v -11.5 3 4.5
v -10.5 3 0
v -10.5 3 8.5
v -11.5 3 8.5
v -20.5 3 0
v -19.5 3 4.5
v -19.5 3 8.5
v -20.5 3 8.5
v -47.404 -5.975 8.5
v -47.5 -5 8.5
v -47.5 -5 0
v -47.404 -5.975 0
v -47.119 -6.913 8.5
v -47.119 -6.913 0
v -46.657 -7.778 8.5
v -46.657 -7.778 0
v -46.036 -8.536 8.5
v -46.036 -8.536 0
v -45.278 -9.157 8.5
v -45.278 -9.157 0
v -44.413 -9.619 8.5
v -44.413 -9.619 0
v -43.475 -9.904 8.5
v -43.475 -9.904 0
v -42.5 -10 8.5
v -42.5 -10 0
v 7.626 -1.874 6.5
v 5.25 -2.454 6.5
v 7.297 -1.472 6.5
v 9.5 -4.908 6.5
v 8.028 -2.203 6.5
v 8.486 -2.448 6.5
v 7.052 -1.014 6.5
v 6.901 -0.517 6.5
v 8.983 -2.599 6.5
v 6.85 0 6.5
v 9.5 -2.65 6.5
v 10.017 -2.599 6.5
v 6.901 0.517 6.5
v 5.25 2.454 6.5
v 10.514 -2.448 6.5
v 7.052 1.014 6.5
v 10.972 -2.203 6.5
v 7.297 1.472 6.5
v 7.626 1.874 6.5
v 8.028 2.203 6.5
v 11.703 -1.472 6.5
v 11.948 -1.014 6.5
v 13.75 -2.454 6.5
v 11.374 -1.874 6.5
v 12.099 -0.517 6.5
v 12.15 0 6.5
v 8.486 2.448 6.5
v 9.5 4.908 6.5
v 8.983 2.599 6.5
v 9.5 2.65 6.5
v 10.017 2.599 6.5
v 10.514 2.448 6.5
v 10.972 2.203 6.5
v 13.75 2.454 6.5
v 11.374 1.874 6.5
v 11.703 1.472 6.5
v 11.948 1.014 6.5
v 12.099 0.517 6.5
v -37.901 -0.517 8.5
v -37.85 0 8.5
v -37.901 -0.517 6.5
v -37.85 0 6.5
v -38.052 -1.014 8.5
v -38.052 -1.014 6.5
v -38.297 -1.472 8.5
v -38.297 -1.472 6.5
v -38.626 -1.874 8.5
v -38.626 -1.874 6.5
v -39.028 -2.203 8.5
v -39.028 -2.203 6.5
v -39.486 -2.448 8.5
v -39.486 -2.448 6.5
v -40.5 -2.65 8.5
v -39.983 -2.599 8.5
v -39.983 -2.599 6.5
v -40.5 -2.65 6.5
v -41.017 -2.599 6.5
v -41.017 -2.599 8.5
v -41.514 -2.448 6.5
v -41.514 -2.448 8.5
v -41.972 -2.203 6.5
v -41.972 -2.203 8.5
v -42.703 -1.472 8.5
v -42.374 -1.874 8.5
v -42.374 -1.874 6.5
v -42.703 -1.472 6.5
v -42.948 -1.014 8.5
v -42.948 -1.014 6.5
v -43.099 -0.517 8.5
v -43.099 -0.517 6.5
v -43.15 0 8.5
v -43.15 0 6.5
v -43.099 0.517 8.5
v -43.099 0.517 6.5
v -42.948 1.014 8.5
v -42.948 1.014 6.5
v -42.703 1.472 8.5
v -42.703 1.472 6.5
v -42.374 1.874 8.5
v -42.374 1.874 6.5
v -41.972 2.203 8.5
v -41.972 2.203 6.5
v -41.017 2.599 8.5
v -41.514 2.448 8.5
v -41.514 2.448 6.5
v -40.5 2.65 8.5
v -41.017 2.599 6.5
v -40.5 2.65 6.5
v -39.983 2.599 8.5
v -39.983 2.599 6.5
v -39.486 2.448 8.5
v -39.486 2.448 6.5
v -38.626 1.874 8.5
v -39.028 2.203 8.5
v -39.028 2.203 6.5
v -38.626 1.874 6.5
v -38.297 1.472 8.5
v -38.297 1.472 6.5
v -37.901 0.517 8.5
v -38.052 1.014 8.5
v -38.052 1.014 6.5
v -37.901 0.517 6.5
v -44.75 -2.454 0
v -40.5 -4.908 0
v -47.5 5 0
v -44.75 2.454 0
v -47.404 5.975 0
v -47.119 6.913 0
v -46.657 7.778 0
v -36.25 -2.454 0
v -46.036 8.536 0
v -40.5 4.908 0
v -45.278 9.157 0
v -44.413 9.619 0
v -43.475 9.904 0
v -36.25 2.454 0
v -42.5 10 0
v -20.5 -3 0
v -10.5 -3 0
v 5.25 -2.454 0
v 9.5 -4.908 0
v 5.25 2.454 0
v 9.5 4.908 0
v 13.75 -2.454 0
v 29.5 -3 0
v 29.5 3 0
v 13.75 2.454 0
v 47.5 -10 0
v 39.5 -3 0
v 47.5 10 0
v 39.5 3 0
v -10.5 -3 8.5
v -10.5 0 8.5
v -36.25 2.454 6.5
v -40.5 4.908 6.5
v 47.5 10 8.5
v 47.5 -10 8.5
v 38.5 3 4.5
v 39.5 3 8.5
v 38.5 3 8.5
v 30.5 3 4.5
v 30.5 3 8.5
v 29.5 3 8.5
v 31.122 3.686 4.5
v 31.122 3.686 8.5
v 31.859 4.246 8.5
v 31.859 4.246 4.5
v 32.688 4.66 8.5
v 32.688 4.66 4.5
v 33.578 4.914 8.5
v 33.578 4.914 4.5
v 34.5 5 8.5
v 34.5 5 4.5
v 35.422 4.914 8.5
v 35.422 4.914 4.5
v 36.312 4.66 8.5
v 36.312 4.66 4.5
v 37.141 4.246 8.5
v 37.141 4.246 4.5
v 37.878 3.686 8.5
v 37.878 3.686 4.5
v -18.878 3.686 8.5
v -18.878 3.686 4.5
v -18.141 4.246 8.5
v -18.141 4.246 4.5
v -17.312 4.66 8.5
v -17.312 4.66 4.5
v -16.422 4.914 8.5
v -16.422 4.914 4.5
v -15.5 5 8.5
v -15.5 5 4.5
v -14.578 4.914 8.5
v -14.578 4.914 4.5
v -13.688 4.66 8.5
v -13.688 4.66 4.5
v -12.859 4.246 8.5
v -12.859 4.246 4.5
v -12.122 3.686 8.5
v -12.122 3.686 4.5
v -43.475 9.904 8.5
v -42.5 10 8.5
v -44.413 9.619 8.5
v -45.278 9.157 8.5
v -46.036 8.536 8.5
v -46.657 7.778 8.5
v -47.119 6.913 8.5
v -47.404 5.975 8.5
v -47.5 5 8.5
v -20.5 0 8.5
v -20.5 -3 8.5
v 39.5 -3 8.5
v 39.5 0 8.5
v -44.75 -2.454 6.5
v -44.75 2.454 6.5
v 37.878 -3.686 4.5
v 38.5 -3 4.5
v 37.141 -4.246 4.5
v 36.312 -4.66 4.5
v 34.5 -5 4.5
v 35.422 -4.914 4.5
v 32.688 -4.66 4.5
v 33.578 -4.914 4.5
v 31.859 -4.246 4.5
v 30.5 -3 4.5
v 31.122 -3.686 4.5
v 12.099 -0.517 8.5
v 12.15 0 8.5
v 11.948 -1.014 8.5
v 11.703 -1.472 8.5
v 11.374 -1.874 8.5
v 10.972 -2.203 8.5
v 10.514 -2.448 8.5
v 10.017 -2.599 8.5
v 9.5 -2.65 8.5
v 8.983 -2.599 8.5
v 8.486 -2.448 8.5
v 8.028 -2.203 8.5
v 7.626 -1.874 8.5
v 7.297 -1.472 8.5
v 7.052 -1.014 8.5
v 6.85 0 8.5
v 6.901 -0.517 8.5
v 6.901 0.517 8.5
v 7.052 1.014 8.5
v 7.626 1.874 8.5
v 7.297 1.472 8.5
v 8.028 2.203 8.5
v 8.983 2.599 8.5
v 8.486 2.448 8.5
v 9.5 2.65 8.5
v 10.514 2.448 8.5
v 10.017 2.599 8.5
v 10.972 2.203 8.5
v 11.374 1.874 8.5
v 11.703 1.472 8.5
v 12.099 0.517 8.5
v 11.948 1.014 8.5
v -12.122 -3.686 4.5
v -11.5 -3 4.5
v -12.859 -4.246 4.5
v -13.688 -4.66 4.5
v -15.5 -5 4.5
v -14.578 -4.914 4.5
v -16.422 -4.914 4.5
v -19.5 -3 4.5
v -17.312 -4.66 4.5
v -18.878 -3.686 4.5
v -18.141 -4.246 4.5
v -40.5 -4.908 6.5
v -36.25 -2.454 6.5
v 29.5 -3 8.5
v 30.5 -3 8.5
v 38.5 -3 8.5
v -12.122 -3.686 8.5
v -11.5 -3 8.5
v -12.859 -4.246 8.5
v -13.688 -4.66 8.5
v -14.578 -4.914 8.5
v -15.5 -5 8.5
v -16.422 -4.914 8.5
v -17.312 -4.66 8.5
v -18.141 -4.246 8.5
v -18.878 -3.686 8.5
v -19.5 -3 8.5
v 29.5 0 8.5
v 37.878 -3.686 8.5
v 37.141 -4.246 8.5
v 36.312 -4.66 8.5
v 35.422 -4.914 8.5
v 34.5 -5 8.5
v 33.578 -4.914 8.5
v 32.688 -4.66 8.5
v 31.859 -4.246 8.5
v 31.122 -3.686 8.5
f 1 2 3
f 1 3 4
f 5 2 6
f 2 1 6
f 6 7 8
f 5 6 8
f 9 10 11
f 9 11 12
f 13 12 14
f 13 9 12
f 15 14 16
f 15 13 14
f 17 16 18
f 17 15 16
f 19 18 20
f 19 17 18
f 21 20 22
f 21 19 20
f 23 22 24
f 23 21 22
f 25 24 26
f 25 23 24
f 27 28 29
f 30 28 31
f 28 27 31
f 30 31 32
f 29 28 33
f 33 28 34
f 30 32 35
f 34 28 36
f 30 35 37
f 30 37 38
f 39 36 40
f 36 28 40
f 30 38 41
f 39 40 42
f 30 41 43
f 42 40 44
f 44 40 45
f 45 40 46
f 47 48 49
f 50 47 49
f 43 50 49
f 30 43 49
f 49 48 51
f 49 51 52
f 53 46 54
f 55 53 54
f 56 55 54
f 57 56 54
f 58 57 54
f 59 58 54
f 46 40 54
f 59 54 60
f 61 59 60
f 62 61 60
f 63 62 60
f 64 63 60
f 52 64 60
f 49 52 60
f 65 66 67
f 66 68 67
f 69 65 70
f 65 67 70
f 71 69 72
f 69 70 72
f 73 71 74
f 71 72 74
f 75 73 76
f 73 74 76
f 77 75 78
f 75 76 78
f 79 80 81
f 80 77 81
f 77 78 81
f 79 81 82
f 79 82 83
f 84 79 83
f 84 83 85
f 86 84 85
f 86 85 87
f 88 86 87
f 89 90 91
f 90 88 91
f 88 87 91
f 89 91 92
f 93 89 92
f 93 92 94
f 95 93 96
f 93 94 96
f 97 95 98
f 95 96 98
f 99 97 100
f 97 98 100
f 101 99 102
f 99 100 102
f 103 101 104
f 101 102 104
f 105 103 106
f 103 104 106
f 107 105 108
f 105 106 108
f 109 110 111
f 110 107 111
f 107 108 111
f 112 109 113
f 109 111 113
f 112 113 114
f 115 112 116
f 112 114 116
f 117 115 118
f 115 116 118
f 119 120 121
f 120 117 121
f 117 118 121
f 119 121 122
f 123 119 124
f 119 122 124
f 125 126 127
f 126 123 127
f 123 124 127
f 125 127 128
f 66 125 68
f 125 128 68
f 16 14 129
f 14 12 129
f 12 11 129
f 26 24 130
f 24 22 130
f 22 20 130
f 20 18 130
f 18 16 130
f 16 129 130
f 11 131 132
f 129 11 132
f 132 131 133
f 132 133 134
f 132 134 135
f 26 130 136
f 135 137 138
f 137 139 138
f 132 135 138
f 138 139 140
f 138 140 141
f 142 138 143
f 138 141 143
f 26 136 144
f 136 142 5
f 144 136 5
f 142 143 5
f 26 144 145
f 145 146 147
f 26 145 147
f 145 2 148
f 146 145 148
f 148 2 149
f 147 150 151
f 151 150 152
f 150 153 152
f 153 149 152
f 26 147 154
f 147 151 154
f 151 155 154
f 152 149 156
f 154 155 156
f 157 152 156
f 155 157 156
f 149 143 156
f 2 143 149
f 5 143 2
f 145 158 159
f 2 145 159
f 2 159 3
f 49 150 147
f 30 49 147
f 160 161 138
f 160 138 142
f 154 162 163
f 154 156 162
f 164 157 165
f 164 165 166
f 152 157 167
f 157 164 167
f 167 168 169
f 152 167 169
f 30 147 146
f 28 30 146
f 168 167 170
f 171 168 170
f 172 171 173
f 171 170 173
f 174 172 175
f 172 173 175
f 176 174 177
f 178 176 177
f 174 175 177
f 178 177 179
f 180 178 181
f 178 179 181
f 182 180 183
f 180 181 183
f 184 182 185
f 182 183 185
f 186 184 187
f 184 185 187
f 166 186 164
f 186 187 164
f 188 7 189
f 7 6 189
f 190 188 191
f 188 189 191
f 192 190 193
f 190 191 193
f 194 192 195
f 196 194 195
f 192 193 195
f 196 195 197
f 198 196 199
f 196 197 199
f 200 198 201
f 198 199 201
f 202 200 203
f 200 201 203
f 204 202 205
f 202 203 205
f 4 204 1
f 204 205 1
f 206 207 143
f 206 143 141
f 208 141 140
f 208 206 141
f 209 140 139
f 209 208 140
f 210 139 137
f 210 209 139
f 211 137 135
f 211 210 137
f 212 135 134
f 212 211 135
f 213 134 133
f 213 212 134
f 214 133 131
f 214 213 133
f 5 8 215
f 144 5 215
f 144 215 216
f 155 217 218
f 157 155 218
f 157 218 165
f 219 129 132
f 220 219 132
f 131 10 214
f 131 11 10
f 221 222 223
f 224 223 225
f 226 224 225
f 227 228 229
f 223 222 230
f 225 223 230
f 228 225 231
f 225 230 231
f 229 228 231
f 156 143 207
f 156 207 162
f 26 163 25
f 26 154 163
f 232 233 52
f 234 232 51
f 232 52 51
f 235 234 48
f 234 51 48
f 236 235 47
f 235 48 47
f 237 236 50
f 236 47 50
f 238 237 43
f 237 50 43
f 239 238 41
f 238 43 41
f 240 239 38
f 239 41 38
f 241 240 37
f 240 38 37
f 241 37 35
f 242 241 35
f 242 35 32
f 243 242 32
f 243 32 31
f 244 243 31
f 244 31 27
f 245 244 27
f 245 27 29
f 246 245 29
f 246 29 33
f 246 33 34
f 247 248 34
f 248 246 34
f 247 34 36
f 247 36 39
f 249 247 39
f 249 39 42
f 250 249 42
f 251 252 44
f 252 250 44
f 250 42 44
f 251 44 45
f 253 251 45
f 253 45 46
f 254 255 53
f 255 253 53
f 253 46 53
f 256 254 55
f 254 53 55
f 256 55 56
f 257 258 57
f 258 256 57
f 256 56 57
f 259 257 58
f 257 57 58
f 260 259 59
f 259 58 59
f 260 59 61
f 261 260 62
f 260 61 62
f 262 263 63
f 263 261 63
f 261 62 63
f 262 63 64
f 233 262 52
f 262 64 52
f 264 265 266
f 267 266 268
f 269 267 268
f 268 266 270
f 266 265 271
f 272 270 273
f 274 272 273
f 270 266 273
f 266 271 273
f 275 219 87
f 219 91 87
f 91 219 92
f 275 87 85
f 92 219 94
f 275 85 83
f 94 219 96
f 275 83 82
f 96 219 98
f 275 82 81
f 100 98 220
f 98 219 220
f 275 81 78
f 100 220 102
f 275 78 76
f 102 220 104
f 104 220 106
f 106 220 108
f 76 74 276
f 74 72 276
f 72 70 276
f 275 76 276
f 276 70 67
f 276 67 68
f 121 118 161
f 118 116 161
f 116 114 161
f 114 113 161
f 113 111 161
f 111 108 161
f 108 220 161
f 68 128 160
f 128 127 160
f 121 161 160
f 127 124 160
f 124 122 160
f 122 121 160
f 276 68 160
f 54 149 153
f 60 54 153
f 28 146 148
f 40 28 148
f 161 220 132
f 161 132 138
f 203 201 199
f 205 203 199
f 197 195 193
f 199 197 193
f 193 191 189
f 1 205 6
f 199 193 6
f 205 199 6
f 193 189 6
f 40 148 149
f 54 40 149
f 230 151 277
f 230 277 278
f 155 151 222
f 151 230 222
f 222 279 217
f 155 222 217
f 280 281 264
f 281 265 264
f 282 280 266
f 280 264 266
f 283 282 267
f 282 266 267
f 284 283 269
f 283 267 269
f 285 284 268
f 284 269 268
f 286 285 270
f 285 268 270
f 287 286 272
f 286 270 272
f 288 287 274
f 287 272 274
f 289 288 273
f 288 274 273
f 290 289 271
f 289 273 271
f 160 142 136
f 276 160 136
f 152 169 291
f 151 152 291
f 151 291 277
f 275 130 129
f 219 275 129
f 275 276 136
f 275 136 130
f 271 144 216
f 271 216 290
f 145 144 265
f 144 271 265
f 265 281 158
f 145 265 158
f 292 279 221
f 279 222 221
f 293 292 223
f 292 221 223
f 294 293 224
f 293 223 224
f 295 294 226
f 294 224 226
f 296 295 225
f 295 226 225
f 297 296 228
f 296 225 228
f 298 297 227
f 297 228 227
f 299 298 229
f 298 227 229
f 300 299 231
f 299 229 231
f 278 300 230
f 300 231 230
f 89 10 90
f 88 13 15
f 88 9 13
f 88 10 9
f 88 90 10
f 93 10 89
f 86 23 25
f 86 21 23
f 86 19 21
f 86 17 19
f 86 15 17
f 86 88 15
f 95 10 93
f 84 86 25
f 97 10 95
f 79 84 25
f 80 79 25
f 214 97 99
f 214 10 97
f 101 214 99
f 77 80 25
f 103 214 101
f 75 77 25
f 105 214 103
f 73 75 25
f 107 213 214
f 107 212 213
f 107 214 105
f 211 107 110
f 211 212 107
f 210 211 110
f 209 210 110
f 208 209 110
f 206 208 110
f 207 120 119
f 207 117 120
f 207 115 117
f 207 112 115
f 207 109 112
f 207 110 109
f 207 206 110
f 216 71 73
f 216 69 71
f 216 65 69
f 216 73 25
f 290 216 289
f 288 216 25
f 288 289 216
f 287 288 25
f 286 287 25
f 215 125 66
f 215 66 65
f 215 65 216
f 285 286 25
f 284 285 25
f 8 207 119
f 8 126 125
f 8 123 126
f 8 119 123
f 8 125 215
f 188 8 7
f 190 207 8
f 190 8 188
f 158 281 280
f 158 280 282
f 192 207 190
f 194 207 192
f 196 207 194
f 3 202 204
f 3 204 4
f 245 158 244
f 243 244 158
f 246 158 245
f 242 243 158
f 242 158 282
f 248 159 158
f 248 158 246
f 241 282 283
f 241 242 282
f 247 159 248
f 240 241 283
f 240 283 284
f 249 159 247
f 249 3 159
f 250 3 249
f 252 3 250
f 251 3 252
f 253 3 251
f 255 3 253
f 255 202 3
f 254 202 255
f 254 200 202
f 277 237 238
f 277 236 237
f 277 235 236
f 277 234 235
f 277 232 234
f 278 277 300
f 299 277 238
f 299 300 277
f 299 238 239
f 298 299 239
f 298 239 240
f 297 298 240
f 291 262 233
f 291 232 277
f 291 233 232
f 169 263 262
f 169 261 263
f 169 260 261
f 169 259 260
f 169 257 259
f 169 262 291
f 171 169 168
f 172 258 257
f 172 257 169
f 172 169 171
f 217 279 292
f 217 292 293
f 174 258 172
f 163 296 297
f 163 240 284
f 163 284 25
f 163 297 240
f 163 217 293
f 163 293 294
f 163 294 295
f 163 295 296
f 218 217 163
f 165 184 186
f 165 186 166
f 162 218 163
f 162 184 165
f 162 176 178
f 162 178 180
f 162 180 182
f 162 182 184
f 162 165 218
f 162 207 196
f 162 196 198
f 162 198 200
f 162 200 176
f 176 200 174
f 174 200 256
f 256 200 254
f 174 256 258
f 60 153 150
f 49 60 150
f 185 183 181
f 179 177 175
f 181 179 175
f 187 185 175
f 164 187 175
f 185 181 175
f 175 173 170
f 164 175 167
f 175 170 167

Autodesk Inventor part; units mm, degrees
ref_plane "YZ Plane" through (0, 0, 0) normal (1, 0, 0) x (0, 1, 0)
ref_plane "XZ Plane" through (0, 0, 0) normal (0, 1, 0) x (-1, 0, 0)
ref_plane "XY Plane" through (0, 0, 0) normal (0, 0, 1) x (1, 0, 0)
sketch "Skizze1" plane through (0, 0, 0) normal (0, 0, 1) x (1, 0, 0)
  line L0 (47.5, -10) -> (-47.5, -10)
  line L1 (-47.5, -10) -> (-47.5, 10)
  line L2 (-47.5, 10) -> (47.5, 10)
  line L3 (47.5, 10) -> (47.5, -10)
  line L4 (47.5, -10) -> (-47.5, 10) construction
  line L5 (-47.5, -10) -> (47.5, 10) construction
  circle A0 centre (-40.5, 0) radius 2.65
  circle A1 centre (9.5, 0) radius 2.65
  line L6 (-44.75, -2.4537) -> (-44.75, 2.4537)
  line L7 (-44.75, 2.4537) -> (-40.5, 4.9075)
  line L8 (-40.5, 4.9075) -> (-36.25, 2.4537)
  line L9 (-36.25, 2.4537) -> (-36.25, -2.4537)
  line L10 (-36.25, -2.4537) -> (-40.5, -4.9075)
  line L11 (-40.5, -4.9075) -> (-44.75, -2.4537)
  line L12 (5.25, -2.4537) -> (5.25, 2.4537)
  line L13 (5.25, 2.4537) -> (9.5, 4.9075)
  line L14 (9.5, 4.9075) -> (13.75, 2.4537)
  line L15 (13.75, 2.4537) -> (13.75, -2.4537)
  line L16 (13.75, -2.4537) -> (9.5, -4.9075)
  line L17 (9.5, -4.9075) -> (5.25, -2.4537)
  point P0 (0, 0)
  point P1 (0, 0)
  point P2 (0, 0)
  point P3 (-2.125, 0)
  point P4 (-2.125, 0)
  point P5 (-2.125, 0)
  dimension "d0" = 20
  dimension "d2" = 5.3
  dimension "d3" = 5.3
  dimension "d4" = 50
  dimension "d13" = 38
  dimension "d26" = 8.5
  dimension "d27" = 8.5
  dimension "d42" = 7
extrude "Extrusion1" add sketch "Skizze1" along normal blind 8.5 contours L0 L1 L2 L3 | L6 L7 L8 L9 L10 L11 | L12 L13 L14 L15 L16 L17
extrude "Extrusion2" cut sketch "Skizze1" along normal blind 6.5 contours A1 | L6 L7 L8 L9 L10 L11 | L12 L13 L14 L15 L16 L17
sketch "Skizze2" plane through (0, 0, 8.5) normal (0, 0, 1) x (1, 0, 0)
  line L0 (-47.5, -10) -> (47.5, -10) projected
  line L1 (47.5, -10) -> (47.5, 10) projected
  line L2 (47.5, 10) -> (-47.5, 10) projected
  line L3 (-47.5, 10) -> (-47.5, -10) projected
  line L4 (-47.5, 10) -> (-47.5, -10) projected
  line L5 (-47.5, 0) -> (47.5, 0) construction
  line L6 (47.5, -10) -> (47.5, 10) projected
  point P0 (0, 0)
  point P1 (-15.5, 0)
  point P2 (34.5, 0)
hole "Bohrung1" at (-15.5, 0, 8.5) at (34.5, 0, 8.5) direction (0, 0, -1) diameter 5.3 end through all counterbore diameter 10 counterbore depth 4 clearance for "Inbusschraube DIN EN ISO 4762" size "M5" standard "DIN"
fillet "Rundung1" radius 5 2 edges at (-47.5, -10, 4.25) (-47.5, 10, 4.25)
sketch "Skizze3" plane through (0, 0, 8.5) normal (0, 0, 1) x (1, 0, 0)
  line L0 (39.5, 3) -> (29.5, 3)
  line L1 (29.5, 3) -> (29.5, -3)
  line L2 (29.5, -3) -> (39.5, -3)
  line L3 (39.5, -3) -> (39.5, 3)
  circle A0 centre (34.5, 0) radius 2.65 projected
  line L4 (39.5, 3) -> (29.5, -3) construction
  line L5 (29.5, 3) -> (39.5, -3) construction
  circle A1 centre (-15.5, 0) radius 2.65 projected
  line L6 (-10.5, 3) -> (-20.5, 3)
  line L7 (-20.5, 3) -> (-20.5, -3)
  line L8 (-20.5, -3) -> (-10.5, -3)
  line L9 (-10.5, -3) -> (-10.5, 3)
  line L10 (-10.5, 3) -> (-20.5, -3) construction
  line L11 (-20.5, 3) -> (-10.5, -3) construction
  point P0 (0, 0)
  dimension "d51" = 6
  dimension "d52" = 10
extrude "Extrusion4" cut sketch "Skizze3" against normal through all
equation "\"d3\" = d2"
equation "\"d27\" = d26"
properties part number "Door_Basis" material "ABS-Kunststoff"
